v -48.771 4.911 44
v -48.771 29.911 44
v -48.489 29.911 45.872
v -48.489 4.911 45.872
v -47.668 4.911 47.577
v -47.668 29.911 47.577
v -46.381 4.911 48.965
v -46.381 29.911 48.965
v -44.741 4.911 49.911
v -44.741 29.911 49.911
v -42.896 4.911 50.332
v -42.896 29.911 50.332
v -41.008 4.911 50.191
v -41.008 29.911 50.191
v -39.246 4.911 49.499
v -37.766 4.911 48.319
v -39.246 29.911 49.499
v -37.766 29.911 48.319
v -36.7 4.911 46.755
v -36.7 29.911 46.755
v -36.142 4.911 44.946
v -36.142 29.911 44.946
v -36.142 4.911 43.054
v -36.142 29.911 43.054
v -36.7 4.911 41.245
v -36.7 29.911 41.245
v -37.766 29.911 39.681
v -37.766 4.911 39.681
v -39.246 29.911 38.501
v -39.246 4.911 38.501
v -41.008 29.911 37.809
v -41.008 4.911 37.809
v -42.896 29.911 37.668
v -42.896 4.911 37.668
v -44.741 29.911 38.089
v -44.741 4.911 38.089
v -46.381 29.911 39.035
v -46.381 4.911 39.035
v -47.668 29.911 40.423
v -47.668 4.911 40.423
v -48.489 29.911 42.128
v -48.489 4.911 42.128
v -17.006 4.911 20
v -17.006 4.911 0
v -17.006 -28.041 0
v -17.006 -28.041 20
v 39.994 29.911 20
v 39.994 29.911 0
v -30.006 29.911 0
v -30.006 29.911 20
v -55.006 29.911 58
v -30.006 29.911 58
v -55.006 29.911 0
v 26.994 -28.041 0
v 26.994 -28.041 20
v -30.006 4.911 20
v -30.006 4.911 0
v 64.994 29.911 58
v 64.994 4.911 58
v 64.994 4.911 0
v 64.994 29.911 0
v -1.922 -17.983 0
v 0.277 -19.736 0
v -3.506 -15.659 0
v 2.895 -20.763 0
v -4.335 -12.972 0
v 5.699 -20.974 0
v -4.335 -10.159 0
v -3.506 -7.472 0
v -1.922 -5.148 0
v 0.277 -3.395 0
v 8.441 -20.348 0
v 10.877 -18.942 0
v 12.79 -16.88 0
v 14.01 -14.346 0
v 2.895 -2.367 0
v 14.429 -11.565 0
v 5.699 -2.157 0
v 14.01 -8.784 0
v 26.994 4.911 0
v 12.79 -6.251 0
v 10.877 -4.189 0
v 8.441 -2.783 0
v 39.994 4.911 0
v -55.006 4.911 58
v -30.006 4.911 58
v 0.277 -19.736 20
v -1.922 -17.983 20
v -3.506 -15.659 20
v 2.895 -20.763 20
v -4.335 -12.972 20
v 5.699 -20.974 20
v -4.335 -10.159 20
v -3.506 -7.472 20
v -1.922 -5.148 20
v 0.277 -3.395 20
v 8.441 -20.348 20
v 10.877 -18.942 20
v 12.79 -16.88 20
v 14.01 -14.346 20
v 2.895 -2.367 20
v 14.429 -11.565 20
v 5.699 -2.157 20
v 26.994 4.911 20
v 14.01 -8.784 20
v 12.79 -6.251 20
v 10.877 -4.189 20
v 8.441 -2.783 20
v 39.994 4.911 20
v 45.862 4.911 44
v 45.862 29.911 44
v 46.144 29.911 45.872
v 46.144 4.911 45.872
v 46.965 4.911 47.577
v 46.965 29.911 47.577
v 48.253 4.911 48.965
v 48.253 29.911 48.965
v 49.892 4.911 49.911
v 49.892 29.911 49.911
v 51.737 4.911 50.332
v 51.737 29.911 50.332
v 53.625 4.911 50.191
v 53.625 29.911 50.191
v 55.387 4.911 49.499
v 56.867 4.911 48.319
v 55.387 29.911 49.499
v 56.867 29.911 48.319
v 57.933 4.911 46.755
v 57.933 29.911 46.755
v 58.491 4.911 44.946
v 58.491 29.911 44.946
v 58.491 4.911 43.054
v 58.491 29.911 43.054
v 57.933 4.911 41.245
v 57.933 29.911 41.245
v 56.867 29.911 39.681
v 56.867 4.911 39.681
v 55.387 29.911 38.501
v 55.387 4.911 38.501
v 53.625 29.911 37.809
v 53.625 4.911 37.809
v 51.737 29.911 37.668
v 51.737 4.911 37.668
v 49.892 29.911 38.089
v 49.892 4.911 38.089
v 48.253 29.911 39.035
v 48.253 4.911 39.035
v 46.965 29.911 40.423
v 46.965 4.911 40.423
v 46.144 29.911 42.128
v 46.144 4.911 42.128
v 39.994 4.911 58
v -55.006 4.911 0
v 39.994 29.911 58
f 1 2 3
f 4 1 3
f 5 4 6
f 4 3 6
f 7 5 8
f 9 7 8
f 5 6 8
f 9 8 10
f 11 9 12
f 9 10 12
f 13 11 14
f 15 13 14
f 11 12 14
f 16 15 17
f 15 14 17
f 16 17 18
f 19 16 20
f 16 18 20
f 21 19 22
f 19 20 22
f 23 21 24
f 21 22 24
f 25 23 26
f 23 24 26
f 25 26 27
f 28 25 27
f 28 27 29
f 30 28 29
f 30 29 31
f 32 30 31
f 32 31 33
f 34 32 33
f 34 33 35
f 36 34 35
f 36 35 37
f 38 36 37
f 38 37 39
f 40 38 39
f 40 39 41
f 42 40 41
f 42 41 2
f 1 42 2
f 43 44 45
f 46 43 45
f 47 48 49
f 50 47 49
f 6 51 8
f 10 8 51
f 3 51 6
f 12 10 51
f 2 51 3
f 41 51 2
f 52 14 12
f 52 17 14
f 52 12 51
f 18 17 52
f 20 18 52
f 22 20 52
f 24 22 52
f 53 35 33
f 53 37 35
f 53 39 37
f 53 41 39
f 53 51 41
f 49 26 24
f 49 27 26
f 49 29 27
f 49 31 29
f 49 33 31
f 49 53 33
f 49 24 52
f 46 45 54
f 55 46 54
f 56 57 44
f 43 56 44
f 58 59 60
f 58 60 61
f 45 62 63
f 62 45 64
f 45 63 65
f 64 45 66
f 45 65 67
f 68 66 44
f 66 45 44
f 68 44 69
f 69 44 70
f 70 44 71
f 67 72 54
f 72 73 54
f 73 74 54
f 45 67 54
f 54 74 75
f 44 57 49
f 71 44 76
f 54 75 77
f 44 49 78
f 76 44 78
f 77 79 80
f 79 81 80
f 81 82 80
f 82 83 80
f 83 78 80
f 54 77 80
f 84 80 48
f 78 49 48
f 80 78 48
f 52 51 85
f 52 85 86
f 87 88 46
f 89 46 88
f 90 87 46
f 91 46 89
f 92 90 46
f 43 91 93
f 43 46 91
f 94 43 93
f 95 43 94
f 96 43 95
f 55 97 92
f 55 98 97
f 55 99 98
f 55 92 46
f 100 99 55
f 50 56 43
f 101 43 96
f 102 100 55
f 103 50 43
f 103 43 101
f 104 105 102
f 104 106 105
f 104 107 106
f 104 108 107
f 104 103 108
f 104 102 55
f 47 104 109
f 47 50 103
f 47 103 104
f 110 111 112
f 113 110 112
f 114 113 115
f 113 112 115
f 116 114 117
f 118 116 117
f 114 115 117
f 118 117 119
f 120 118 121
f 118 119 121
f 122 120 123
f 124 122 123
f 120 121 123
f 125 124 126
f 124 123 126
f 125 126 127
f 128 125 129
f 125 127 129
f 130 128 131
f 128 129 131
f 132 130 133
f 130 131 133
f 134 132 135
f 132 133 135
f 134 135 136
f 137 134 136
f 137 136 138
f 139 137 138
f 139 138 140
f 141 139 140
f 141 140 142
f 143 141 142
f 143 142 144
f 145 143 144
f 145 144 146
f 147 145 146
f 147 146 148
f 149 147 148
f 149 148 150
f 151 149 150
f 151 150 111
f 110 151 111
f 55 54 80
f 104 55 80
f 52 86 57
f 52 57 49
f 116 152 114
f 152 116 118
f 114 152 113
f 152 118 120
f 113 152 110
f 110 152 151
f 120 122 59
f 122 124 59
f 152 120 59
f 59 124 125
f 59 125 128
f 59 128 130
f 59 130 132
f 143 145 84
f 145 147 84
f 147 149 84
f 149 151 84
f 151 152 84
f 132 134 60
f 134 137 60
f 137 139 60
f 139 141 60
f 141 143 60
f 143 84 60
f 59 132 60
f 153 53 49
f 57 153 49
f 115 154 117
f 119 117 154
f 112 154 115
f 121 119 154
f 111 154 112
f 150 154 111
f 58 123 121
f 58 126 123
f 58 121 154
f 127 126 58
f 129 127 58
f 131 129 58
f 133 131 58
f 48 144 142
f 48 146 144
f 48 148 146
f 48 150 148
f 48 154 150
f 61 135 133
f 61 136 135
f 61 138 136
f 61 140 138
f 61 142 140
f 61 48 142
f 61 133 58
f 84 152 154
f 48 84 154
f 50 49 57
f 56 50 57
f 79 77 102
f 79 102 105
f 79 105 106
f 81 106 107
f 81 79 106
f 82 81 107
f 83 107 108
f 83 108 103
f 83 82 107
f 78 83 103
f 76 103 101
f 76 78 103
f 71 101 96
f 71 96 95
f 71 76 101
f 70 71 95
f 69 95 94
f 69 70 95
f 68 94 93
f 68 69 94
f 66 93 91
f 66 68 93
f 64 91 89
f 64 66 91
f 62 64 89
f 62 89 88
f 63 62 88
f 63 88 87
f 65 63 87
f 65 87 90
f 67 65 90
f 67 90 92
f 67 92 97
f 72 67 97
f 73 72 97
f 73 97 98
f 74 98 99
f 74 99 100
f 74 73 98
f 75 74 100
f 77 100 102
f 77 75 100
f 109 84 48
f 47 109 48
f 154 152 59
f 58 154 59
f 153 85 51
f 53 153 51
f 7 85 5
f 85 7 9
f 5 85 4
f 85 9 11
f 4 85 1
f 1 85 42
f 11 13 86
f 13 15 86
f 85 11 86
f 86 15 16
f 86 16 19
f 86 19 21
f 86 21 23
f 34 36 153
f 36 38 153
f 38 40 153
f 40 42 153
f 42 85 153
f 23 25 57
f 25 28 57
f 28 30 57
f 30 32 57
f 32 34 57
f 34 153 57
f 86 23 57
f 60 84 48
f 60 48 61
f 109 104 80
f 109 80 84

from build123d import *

# Parameters (mm, degrees)
F0_W     = 25
F0_H     = 25
F1_DEPTH = 58
F0_R     = 9.434677
F2_DEPTH = 20
F4_D     = 12.7


with BuildPart() as f1:
    # F0 (on Top) → F1 (new body)
    with BuildSketch(Plane.XY):
        with Locations((-42.50558, 17.410632)):
            Rectangle(F0_W, F0_H)
        with Locations((52.49442, 17.410632)):
            Rectangle(F0_W, F0_H)
    extrude(amount=F1_DEPTH)

    # F4 (through all)
    with Locations(Plane.XZ):
        with Locations((-42.421359, 44), (52.211914, 44)):
            Hole(F4_D / 2)


with BuildPart() as f2:
    # F0 (on Top) → F2 (new body)
    with BuildSketch(Plane.XY):
        Polygon((39.99442, 29.910632), (-30.00558, 29.910632), (-30.00558, 4.910632), (-17.00558, 4.910632), (-17.00558, -28.041313), (26.99442, -28.041313), (26.99442, 4.910632), (39.99442, 4.910632), align=None)
        with Locations((4.99442, -11.56534)):
            Circle(F0_R, mode=Mode.SUBTRACT)
    extrude(amount=F2_DEPTH)


solid = Compound([f1.part, f2.part])
